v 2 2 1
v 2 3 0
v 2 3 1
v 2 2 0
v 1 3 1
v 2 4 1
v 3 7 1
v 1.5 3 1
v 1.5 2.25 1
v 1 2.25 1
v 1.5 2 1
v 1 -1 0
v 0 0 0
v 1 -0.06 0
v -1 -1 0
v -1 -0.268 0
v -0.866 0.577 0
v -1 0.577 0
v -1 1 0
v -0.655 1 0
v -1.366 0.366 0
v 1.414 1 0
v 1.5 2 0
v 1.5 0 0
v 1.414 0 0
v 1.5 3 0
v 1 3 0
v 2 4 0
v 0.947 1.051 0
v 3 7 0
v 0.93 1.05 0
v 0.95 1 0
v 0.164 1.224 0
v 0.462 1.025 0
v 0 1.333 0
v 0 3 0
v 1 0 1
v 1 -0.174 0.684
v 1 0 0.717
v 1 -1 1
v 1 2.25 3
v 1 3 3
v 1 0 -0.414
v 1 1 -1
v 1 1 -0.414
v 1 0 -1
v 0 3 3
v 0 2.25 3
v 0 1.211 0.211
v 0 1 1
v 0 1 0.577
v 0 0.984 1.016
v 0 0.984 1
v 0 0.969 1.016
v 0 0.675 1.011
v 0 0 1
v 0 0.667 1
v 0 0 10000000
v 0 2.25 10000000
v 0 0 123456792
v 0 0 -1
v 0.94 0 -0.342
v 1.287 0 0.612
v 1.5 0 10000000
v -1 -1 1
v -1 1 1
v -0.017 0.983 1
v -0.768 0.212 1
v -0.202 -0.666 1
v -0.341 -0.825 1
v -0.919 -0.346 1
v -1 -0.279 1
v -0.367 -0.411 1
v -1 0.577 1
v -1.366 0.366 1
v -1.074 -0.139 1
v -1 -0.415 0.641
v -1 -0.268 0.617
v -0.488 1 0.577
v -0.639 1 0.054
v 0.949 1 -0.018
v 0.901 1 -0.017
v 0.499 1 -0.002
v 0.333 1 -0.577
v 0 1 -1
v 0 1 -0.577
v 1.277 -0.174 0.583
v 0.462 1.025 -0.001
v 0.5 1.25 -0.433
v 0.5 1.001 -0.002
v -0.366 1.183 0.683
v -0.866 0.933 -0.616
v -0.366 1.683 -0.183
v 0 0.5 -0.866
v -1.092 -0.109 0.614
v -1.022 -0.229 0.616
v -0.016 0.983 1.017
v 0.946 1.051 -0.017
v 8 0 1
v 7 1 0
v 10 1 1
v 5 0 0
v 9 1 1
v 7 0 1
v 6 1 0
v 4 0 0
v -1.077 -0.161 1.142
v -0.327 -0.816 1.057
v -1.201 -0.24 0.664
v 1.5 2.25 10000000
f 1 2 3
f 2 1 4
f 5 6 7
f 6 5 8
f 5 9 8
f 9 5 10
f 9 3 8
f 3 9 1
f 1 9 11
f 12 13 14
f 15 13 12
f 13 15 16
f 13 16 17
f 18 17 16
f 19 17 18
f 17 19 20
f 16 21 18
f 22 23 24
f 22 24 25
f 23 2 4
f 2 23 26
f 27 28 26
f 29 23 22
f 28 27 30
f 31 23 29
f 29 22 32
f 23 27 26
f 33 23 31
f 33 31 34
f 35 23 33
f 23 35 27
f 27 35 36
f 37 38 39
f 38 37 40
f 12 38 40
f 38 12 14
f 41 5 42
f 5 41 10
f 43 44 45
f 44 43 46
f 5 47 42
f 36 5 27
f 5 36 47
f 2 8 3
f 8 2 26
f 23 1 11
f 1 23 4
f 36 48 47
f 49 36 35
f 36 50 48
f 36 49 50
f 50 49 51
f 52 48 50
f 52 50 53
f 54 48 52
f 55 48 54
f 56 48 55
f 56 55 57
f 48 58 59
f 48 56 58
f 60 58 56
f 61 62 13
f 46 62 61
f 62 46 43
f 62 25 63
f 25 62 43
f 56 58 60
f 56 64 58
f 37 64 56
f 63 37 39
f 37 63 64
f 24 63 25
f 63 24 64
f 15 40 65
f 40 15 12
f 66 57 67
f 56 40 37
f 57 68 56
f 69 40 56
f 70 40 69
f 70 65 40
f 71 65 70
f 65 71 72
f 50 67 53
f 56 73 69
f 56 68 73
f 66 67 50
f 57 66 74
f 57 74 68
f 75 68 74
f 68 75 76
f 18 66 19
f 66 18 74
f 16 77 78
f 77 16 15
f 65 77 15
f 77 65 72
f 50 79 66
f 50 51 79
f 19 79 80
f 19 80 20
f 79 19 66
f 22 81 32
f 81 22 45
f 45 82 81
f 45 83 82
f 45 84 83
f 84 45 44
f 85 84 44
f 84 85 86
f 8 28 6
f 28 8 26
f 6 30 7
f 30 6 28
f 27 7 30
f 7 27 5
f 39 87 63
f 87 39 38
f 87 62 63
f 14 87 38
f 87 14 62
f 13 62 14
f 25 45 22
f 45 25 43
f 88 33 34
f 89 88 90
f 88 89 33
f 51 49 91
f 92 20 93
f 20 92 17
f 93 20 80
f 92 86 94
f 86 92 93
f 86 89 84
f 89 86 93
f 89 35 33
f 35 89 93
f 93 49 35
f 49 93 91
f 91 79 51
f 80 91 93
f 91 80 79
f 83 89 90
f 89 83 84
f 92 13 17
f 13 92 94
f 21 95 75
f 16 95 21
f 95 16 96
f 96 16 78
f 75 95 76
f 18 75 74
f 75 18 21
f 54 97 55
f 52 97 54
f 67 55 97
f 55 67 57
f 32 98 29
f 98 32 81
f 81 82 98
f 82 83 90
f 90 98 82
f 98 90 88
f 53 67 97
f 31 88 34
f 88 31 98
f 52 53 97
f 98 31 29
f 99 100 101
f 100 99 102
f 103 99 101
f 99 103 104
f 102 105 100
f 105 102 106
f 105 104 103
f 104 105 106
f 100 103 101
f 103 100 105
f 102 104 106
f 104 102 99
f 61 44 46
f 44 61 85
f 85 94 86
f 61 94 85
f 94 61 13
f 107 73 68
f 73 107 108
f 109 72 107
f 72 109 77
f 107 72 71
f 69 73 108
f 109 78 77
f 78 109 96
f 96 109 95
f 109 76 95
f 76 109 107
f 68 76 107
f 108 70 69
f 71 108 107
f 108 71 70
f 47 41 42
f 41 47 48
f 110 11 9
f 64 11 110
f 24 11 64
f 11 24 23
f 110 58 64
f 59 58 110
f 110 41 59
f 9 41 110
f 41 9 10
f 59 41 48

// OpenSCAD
translate([1,2]) cube(); translate(5) cube(); scale(2) square(); scale([2,3]) square(); mirror([1,1,0]) cube(); mirror() cube(); rotate([90,0,0]) cube(); rotate(a=90, v=[0,0,1]) cube(); rotate([0,0,0]) cube(); multmatrix([[1,2],[3,4]]) cube(); rotate(a=[10,20]) cube(); rotate(v=[1,0,0]) cube();
rotate(90, [1,0,0]) cube(); rotate(30, [0,0,0]) cube(); rotate(180) cube(); rotate(270) cube(); rotate(45, [0,1,0]) cube(); rotate([30,60,90]) cube(); rotate(360) cube(); rotate(-90) cube(); rotate(120) cube(); rotate(1e-20) cube(); rotate(450) cube();
cube([1,"a",3]); cube([1,2]); cube([1,2,3,4]); cube(size=undef); translate([1,"a",3]) cube(); translate([1,2,3,4]) cube(); scale([1,2,3,4]) cube(); scale("a") cube(); scale([0.5]) cube(); rotate([1,2,3,4]) cube(); rotate("x") cube(); multmatrix("x") cube(); multmatrix([[1,2,3,4,5]]) cube(); mirror([0,0,0]) cube(); mirror([1,0]) cube(); mirror([0,0,2]) cube();
rotate(33, [1,2,3]) rotate([12.5, -7, 200]) translate([0.1, 0.2, 0.3]) scale([1, -1, 0.5]) cube();
resize([1,2]) cube(); resize(newsize=[1,0,3], auto=true) cube(); resize([1,2,3], auto=[true,false,true]) cube(); resize(5) cube(); resize([1.5,2.25,1e7]) cube(); resize([0.000001, 1, 2]) cube(); resize([0.0001, 0.00001, 123456789]) cube();
color("Red") cube(); color("nocolor") cube(); color("#0f0") cube(); color("#00ff0080") cube(); color("#0f08") cube(); color([0.5,0.5]) cube(); color([1,0,0], 0.2) cube(); color("red", alpha=0.1) cube(); color(c="green") cube(); color() cube(); color(5) cube(); color("transparent") cube(); color([2,-1,0.5,1]) cube(); color("#zzzzzz") cube(); color("rebeccapurple") cube(); color("grey") cube();
